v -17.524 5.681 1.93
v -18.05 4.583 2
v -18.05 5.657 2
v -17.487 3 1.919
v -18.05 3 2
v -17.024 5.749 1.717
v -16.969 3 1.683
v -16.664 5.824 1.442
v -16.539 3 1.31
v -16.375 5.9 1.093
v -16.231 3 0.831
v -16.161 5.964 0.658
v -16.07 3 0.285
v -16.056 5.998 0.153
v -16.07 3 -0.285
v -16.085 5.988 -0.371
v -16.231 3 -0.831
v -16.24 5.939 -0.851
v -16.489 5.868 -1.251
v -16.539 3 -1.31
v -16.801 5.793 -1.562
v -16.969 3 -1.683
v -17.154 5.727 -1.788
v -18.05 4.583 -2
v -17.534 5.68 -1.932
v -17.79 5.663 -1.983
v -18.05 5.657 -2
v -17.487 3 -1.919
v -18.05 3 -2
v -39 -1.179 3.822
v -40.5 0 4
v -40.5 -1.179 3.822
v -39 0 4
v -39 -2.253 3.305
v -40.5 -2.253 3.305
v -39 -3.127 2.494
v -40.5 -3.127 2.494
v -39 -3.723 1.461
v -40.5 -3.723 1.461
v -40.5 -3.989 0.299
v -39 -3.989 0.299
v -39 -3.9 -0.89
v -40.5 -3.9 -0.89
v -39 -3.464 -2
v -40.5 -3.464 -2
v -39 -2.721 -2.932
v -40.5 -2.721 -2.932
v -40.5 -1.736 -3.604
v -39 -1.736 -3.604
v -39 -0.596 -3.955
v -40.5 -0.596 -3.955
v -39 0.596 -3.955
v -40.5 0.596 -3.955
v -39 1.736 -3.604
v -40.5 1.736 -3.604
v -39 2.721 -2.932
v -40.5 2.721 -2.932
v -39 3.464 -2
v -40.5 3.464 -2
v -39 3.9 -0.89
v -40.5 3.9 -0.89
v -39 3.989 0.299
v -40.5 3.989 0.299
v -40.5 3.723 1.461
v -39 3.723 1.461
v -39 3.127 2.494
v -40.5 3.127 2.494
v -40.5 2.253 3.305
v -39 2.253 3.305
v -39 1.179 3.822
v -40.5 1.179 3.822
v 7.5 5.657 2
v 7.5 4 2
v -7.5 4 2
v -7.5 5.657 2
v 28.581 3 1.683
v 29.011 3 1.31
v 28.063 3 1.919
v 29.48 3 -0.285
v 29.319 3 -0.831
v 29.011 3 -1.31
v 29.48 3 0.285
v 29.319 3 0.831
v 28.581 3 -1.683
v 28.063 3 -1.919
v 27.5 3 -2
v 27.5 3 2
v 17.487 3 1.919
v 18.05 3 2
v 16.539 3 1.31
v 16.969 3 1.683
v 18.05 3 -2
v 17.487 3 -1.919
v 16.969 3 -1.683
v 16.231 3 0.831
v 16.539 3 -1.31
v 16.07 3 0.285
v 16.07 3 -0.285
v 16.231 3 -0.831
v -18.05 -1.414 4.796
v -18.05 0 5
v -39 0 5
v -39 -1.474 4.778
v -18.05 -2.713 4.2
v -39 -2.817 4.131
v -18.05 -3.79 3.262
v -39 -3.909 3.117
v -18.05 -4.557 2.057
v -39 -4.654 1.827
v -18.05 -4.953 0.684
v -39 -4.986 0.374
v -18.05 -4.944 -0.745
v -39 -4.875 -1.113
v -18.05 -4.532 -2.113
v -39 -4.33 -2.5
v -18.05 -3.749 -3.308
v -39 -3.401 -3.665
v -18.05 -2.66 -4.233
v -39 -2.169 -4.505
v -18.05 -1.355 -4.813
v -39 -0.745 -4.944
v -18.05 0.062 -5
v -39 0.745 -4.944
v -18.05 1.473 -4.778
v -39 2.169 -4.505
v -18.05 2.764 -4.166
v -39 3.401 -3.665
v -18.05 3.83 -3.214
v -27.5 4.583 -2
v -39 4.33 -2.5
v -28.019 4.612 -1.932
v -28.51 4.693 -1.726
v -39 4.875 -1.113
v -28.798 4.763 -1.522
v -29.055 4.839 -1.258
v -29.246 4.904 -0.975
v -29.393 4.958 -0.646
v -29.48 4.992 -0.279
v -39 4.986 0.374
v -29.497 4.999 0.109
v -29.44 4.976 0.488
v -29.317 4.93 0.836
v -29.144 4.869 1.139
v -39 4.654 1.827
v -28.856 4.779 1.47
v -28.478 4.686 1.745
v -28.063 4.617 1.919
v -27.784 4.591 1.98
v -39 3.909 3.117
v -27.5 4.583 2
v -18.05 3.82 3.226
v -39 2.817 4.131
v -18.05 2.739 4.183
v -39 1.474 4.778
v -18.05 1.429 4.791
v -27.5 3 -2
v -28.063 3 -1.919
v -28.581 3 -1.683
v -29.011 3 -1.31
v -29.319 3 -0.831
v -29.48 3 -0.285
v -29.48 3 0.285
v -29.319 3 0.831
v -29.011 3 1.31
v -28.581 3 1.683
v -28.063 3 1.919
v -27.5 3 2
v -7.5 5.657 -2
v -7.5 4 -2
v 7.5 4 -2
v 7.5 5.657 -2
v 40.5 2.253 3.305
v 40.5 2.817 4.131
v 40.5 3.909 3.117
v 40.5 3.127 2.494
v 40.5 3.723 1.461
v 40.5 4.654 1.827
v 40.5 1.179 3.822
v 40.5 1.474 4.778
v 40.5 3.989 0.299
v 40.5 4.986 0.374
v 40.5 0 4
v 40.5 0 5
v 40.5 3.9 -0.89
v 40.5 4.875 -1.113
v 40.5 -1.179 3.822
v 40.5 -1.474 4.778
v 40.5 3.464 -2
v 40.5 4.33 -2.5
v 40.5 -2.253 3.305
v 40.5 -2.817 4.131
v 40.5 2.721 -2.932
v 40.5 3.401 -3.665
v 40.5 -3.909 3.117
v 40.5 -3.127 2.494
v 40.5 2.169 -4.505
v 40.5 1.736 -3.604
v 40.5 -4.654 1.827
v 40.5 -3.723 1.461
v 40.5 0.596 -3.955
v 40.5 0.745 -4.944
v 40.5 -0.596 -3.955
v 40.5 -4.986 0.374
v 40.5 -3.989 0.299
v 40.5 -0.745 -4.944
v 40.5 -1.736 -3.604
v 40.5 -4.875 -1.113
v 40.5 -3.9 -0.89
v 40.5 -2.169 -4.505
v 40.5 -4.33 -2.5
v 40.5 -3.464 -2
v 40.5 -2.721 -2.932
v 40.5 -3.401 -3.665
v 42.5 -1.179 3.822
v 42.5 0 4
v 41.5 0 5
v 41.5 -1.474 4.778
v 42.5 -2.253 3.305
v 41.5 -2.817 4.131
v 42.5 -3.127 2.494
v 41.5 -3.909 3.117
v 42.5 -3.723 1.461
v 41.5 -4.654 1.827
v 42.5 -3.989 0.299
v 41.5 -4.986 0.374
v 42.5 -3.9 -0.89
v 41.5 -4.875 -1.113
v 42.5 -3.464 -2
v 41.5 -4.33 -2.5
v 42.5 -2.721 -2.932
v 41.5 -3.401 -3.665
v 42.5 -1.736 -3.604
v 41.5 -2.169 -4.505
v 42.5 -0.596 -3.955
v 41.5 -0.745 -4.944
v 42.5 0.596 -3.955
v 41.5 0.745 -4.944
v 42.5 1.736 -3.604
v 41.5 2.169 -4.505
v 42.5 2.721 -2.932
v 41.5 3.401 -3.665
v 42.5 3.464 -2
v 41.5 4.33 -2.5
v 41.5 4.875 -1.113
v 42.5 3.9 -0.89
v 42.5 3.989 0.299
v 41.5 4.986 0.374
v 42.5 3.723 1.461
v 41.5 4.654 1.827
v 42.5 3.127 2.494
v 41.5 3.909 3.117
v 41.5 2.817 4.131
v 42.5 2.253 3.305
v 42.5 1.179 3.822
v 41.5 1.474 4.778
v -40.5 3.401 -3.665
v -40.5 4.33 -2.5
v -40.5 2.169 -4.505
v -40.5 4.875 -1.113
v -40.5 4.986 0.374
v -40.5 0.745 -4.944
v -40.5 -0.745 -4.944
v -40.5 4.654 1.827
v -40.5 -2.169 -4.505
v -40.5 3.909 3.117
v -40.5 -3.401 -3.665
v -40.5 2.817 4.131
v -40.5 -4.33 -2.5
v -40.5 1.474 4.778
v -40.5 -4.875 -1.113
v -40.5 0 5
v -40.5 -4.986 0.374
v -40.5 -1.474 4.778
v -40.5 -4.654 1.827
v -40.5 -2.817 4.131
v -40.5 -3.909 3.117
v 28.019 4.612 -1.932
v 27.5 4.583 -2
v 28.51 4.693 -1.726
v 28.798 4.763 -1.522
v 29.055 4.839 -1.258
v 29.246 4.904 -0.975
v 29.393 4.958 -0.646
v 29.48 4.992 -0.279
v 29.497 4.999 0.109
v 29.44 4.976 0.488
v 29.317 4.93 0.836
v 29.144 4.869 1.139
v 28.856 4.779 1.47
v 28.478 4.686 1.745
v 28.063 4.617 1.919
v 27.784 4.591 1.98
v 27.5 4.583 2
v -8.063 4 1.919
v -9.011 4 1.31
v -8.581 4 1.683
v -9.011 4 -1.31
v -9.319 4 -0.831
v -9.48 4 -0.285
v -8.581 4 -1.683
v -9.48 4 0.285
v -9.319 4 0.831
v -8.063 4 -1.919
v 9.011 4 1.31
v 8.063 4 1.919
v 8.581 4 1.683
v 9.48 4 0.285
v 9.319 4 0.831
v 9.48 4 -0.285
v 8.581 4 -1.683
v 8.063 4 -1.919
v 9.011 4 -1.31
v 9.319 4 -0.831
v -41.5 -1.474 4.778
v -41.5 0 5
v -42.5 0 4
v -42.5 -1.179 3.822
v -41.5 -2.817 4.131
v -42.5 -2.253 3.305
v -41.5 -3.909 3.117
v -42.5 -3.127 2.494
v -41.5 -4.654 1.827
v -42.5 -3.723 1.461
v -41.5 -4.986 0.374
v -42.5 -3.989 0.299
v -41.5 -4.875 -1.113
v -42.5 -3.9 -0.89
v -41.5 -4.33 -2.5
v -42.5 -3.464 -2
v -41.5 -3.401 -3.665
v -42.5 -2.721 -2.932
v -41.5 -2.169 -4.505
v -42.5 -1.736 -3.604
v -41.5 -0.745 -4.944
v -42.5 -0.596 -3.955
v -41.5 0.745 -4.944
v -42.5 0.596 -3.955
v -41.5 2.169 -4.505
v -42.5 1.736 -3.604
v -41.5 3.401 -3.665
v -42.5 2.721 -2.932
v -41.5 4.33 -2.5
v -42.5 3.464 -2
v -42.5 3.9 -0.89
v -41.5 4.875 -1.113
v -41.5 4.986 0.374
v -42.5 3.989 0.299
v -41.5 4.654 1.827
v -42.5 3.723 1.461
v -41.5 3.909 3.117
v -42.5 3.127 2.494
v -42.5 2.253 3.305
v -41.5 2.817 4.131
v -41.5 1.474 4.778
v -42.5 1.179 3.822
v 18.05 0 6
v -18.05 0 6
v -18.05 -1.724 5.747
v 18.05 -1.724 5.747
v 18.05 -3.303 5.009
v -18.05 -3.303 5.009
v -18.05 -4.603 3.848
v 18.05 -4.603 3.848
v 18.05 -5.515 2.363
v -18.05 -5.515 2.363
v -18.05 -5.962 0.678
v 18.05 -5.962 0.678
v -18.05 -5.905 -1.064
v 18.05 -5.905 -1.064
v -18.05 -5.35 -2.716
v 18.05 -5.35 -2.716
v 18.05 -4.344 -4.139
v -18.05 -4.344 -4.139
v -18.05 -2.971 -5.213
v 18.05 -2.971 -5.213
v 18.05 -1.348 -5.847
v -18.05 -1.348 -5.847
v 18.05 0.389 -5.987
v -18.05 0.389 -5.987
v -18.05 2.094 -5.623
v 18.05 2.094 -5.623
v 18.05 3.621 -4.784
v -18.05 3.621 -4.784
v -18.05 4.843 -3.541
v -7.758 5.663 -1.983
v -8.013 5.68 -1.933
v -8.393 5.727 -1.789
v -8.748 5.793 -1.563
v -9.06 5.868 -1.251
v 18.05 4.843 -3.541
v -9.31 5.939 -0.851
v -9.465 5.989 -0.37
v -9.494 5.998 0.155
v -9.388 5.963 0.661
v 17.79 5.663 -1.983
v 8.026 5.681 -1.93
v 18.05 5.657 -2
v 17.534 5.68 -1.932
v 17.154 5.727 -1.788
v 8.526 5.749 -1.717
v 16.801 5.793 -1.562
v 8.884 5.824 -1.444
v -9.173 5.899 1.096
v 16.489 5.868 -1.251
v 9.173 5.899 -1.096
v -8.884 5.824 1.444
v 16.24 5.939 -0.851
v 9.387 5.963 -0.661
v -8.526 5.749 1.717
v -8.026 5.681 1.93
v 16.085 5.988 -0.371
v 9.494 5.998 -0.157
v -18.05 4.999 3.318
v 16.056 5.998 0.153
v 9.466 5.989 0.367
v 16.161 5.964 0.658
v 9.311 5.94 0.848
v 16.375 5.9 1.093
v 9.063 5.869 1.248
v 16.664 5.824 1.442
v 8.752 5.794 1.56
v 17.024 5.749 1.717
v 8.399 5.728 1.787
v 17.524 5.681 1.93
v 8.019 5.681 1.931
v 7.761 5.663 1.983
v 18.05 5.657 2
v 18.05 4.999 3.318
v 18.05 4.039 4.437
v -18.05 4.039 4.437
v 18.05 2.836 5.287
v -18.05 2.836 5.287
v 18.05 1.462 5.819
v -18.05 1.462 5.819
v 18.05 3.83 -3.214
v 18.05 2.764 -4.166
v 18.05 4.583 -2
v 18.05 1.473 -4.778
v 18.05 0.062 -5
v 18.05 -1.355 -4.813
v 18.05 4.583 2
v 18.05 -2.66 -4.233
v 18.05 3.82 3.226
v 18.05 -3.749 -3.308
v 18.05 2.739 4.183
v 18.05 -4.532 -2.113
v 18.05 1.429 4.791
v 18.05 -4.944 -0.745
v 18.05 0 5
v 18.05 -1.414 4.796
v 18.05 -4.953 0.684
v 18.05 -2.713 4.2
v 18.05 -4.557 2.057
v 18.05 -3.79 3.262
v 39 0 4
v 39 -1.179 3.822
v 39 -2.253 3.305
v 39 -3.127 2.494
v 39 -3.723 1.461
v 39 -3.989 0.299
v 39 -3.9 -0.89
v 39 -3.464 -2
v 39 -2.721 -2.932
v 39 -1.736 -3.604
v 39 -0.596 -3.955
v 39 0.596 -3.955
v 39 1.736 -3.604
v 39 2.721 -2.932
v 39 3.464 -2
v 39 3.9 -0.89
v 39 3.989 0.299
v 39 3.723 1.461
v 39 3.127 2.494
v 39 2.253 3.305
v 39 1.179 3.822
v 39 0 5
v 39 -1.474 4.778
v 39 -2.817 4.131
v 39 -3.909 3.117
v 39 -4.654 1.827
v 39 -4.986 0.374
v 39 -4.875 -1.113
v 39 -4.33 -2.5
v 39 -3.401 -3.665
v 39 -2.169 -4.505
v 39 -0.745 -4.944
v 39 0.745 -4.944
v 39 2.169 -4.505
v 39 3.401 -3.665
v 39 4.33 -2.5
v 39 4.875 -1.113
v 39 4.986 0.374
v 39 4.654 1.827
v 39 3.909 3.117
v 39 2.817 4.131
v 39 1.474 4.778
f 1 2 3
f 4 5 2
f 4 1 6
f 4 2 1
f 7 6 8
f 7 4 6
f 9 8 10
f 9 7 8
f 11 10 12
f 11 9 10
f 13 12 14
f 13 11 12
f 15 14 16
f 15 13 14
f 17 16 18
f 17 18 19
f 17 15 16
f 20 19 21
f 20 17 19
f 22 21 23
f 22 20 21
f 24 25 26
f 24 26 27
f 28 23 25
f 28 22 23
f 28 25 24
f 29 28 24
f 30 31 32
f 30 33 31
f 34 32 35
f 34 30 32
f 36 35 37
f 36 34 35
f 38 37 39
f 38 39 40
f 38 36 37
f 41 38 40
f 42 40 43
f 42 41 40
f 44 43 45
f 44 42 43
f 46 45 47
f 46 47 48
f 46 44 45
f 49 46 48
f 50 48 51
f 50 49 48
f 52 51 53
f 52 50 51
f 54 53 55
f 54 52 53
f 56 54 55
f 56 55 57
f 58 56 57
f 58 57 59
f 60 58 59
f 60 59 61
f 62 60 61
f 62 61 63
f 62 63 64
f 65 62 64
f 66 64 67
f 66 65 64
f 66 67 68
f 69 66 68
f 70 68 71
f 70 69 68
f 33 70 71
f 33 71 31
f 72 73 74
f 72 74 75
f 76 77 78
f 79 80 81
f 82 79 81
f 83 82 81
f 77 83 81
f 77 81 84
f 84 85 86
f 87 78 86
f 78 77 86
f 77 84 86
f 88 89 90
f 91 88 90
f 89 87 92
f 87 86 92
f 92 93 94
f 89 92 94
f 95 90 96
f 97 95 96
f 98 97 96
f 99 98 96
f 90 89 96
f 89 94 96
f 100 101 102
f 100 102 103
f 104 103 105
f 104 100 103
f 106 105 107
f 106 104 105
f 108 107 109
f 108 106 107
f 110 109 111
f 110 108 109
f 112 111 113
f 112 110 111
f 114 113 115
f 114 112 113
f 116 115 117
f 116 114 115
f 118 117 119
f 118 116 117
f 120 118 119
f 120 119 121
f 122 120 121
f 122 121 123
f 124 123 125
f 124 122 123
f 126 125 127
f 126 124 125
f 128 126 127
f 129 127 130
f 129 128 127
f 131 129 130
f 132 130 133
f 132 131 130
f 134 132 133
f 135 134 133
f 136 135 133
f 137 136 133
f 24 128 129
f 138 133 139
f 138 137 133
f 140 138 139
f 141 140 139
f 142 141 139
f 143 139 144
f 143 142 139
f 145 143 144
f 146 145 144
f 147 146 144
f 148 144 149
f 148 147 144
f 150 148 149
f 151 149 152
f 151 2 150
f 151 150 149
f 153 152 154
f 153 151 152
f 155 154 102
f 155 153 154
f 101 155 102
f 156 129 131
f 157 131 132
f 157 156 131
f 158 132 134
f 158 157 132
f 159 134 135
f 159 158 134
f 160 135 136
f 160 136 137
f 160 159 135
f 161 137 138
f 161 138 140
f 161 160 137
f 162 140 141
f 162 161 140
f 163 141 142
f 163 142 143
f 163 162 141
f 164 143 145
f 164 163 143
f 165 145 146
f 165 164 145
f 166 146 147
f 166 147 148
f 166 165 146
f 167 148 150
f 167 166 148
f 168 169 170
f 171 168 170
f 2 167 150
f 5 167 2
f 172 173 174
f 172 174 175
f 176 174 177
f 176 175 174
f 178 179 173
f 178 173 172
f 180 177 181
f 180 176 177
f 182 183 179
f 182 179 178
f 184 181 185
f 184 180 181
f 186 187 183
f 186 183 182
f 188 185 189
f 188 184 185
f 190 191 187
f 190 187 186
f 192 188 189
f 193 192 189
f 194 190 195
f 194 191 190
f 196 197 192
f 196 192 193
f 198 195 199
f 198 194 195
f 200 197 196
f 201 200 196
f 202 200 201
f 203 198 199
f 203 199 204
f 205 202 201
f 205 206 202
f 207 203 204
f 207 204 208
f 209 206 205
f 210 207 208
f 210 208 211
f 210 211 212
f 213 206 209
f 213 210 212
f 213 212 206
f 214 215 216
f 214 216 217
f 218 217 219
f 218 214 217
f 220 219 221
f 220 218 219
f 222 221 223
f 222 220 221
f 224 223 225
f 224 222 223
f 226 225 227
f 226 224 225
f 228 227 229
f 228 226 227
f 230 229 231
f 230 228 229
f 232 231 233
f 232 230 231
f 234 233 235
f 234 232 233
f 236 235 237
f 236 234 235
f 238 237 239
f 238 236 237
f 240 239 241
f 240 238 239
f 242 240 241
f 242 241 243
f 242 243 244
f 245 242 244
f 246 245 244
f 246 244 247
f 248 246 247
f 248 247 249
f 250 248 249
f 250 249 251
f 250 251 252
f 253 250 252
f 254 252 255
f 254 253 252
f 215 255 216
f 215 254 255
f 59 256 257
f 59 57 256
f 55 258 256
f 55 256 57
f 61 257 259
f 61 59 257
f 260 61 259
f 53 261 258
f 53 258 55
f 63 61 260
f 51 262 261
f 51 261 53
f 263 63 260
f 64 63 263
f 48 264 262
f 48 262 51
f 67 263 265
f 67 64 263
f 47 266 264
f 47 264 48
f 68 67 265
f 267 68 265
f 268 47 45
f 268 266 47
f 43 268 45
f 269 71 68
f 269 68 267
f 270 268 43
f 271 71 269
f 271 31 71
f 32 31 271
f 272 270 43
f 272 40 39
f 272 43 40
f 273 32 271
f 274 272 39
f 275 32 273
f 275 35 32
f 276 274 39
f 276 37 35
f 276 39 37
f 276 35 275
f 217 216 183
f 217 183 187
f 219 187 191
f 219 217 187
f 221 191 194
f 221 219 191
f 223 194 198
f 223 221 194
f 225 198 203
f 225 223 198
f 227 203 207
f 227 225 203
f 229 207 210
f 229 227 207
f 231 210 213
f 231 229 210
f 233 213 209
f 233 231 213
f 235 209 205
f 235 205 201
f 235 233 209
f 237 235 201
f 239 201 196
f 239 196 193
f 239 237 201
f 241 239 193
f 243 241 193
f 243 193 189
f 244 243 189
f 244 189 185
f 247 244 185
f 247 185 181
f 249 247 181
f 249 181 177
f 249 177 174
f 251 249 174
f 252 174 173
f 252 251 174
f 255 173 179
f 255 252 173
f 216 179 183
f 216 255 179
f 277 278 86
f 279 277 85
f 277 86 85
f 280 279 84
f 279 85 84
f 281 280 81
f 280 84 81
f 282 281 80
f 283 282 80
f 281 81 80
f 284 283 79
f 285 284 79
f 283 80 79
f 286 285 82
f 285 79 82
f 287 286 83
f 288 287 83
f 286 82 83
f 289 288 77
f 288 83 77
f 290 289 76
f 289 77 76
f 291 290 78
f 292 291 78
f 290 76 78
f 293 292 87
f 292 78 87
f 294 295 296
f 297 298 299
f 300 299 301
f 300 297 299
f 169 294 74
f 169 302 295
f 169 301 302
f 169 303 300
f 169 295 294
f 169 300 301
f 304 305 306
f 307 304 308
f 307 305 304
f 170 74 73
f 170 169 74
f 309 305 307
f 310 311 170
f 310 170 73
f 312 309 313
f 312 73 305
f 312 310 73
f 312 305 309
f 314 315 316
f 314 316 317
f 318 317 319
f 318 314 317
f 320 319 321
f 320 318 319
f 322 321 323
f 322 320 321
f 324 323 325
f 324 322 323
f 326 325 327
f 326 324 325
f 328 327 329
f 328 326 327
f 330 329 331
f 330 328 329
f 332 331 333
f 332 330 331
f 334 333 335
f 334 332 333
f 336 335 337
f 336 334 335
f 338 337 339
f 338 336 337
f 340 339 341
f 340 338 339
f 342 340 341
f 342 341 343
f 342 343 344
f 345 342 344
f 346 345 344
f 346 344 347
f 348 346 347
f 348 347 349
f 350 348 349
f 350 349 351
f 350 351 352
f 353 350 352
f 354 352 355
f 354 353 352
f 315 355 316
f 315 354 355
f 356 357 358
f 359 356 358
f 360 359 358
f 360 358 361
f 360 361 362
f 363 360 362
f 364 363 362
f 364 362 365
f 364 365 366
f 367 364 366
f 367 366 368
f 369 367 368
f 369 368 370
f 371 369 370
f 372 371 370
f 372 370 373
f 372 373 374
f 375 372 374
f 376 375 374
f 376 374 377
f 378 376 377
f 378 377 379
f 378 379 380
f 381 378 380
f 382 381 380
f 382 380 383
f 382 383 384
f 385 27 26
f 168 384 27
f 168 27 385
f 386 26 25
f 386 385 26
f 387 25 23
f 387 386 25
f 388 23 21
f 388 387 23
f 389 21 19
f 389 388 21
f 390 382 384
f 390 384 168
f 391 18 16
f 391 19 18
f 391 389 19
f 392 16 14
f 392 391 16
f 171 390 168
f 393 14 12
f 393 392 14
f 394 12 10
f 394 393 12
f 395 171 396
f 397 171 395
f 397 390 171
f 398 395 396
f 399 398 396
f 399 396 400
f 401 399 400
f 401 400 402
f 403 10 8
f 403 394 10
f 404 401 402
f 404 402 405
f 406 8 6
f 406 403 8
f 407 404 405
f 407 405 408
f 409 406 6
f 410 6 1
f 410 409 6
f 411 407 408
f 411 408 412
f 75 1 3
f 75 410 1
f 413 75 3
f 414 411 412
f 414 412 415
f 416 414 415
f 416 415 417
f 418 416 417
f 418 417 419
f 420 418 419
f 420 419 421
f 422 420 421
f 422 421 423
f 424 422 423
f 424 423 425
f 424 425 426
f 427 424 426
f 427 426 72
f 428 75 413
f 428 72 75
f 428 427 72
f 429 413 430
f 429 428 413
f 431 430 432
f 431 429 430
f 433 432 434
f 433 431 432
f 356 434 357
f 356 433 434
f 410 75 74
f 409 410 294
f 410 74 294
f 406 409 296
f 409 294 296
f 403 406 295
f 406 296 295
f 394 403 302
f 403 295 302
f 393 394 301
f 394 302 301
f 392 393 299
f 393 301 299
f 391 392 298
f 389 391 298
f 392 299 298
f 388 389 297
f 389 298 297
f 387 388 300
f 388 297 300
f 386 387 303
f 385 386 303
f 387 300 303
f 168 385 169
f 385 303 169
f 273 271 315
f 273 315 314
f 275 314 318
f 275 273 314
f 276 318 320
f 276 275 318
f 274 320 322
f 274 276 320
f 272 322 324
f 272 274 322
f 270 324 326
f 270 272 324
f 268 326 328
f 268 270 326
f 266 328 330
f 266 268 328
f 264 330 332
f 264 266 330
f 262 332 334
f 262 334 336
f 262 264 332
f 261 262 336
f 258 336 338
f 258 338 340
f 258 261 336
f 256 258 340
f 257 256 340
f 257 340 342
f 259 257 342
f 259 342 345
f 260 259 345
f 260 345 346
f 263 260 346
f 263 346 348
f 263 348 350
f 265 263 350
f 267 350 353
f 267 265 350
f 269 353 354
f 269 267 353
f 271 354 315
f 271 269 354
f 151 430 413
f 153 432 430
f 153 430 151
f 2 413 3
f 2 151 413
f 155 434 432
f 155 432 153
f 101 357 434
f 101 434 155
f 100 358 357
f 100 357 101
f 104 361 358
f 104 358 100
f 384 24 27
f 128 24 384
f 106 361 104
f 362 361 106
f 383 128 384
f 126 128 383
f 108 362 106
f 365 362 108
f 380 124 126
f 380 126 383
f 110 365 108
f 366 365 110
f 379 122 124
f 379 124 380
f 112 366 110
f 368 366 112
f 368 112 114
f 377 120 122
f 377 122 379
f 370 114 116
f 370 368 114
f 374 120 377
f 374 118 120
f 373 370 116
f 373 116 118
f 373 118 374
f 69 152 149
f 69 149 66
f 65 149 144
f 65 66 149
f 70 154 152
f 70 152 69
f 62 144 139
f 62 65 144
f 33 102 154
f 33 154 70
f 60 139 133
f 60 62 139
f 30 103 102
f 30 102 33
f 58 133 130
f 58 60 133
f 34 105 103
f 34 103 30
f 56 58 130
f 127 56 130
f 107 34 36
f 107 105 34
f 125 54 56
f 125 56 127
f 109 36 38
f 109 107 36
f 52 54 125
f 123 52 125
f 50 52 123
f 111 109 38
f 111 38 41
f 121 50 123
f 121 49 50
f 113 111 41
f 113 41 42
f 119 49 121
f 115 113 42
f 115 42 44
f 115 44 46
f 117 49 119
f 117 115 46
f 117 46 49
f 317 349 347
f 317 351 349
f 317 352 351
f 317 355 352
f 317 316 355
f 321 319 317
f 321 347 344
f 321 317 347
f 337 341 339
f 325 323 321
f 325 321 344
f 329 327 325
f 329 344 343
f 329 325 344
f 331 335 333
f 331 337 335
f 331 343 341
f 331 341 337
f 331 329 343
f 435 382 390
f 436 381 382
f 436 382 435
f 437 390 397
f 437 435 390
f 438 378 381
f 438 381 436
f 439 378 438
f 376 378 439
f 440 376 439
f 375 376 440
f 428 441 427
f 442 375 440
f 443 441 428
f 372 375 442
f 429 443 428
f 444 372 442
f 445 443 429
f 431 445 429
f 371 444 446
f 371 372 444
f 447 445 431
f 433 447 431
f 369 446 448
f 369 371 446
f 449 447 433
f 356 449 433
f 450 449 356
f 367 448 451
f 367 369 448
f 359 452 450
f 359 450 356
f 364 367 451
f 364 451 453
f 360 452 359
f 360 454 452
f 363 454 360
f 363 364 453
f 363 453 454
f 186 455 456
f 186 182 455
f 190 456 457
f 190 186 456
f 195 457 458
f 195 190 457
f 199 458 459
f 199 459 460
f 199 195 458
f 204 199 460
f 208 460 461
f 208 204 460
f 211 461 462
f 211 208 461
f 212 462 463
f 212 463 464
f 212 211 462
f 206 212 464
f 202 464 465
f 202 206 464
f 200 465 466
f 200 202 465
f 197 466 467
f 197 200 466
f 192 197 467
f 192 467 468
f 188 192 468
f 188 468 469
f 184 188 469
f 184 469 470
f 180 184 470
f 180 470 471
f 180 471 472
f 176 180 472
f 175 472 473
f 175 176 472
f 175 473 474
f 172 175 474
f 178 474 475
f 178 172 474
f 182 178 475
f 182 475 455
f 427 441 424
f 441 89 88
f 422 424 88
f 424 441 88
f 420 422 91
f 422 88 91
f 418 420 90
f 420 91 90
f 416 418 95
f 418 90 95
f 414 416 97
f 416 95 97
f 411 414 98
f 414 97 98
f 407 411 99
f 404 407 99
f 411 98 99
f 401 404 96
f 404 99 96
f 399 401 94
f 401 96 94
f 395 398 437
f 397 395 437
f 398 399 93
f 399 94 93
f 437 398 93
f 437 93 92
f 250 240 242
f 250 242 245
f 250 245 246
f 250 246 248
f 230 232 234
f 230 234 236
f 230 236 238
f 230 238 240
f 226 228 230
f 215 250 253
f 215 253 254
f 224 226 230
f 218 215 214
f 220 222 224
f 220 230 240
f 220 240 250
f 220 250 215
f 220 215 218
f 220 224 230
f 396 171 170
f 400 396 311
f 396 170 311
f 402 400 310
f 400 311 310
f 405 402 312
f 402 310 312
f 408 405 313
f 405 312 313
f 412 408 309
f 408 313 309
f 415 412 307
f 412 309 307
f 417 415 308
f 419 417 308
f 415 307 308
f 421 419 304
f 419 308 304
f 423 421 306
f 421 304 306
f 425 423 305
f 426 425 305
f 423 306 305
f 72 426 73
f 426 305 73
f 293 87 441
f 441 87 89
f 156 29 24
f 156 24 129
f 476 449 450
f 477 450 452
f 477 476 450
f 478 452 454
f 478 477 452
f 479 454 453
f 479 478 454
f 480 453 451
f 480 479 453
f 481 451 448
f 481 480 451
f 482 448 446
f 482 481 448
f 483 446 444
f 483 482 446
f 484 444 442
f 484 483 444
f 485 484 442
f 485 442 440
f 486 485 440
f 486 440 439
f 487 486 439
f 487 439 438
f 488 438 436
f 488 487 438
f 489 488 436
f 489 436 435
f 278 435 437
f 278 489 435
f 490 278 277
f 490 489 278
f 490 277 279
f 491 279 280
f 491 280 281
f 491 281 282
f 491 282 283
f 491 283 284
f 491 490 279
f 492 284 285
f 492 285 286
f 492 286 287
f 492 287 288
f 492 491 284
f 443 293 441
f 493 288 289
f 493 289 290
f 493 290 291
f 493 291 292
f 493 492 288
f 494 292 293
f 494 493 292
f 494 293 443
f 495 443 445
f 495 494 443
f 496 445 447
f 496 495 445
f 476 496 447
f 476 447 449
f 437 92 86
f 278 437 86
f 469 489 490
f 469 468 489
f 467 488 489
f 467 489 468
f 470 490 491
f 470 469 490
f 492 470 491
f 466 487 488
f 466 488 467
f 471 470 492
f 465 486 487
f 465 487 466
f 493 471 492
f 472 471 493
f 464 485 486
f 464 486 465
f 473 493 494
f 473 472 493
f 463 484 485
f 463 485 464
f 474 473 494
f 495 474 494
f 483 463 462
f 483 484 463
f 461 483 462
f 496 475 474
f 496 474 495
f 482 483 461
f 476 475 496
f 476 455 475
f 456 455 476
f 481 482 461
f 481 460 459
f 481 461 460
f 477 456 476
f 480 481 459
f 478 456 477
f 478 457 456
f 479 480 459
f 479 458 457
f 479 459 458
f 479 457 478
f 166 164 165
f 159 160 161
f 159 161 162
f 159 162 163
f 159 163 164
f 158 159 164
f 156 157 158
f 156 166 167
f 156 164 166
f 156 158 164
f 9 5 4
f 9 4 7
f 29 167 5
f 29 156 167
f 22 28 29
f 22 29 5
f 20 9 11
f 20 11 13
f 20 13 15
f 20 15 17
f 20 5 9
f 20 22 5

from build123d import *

# Parameters (mm, degrees)
CHAMFER1_SIZE       = 1
SKETCH3_W           = 4
SKETCH3_H           = 4
CUT_EXTRUDE1_DEPTH  = 5
CUT_EXTRUDE2_DEPTH  = 10
CUT_EXTRUDE3_START  = 1
CUT_EXTRUDE3_DEPTH  = 10
BOSS_EXTRUDE1_REACH = 46.071
SKETCH6_W           = 5
SKETCH6_H           = 4


with BuildPart() as part:
    # Sketch1 → Revolve1 (revolve)
    with BuildSketch(Plane.XY, mode=Mode.PRIVATE) as revolve1_sk:
        Polygon((-42.5, 0), (-42.5, 5), (-40.5, 5), (-40.5, 4), (-39, 4), (-39, 5), (-18.05, 5), (-18.05, 6), (18.05, 6), (18.05, 5), (39, 5), (39, 4), (40.5, 4), (40.5, 5), (42.5, 5), (42.5, 0), align=None)
    revolve(revolve1_sk.sketch.rotate(Axis((-47.151991765, 0, 0), (1, 0, 0)), 90), axis=Axis((-47.151991765, 0, 0), (1, 0, 0)))

    # Chamfer1
    chamfer1_edges = [part.edges().sort_by_distance(p)[0] for p in [
        (-42.5, 0, -5),
        (42.5, 0, -5),
    ]]
    chamfer(chamfer1_edges, length=CHAMFER1_SIZE)

    # Sketch3 → Cut-Extrude1 (cut)
    with BuildSketch(Plane(origin=(0, 0, 0), x_dir=(0, 0, -1), z_dir=(1, 0, 0))):
        with Locations((0, 5)):
            Rectangle(SKETCH3_W, SKETCH3_H)
    extrude(amount=-CUT_EXTRUDE1_DEPTH, mode=Mode.SUBTRACT)

    # Sketch4 → Cut-Extrude2 (cut)
    with BuildSketch(Plane(origin=(0, 3, 0), x_dir=(1, 0, 0), z_dir=(0, 1, 0))):
        with BuildLine():
            Line((27.5, -2), (18.05, -2))
            ThreePointArc((18.05, -2), (16.05, 0), (18.05, 2))
            Line((18.05, 2), (27.5, 2))
            ThreePointArc((27.5, 2), (29.5, 0), (27.5, -2))
        make_face()
        with BuildLine():
            Line((-18.05, 2), (-27.5, 2))
            ThreePointArc((-27.5, 2), (-29.5, 0), (-27.5, -2))
            Line((-27.5, -2), (-18.05, -2))
            ThreePointArc((-18.05, -2), (-16.05, 0), (-18.05, 2))
        make_face()
    extrude(amount=CUT_EXTRUDE2_DEPTH, mode=Mode.SUBTRACT)

    # Sketch5 → Cut-Extrude3 (cut)
    with BuildSketch(Plane(origin=(0, 3, 0), x_dir=(1, 0, 0), z_dir=(0, 1, 0)).offset(CUT_EXTRUDE3_START)):
        with BuildLine():
            Line((7.5, -2), (-7.5, -2))
            ThreePointArc((-7.5, -2), (-9.5, 0), (-7.5, 2))
            Line((-7.5, 2), (7.5, 2))
            ThreePointArc((7.5, 2), (9.5, 0), (7.5, -2))
        make_face()
    extrude(amount=CUT_EXTRUDE3_DEPTH, mode=Mode.SUBTRACT)

    # Sketch6 → Boss-Extrude1 (add, up to next)
    with BuildSketch(Plane(origin=(0, 4, 0), x_dir=(1, 0, 0), z_dir=(0, 1, 0)), mode=Mode.PRIVATE) as boss_extrude1_sk1:
        with Locations((-2.5, 0)):
            Rectangle(SKETCH6_W, SKETCH6_H)
    boss_extrude1_tool1 = extrude(boss_extrude1_sk1.sketch, amount=-BOSS_EXTRUDE1_REACH, mode=Mode.PRIVATE) - part.part
    add(boss_extrude1_tool1.solids().sort_by_distance((-2.5, 4, 0))[0])


solid = part.part
